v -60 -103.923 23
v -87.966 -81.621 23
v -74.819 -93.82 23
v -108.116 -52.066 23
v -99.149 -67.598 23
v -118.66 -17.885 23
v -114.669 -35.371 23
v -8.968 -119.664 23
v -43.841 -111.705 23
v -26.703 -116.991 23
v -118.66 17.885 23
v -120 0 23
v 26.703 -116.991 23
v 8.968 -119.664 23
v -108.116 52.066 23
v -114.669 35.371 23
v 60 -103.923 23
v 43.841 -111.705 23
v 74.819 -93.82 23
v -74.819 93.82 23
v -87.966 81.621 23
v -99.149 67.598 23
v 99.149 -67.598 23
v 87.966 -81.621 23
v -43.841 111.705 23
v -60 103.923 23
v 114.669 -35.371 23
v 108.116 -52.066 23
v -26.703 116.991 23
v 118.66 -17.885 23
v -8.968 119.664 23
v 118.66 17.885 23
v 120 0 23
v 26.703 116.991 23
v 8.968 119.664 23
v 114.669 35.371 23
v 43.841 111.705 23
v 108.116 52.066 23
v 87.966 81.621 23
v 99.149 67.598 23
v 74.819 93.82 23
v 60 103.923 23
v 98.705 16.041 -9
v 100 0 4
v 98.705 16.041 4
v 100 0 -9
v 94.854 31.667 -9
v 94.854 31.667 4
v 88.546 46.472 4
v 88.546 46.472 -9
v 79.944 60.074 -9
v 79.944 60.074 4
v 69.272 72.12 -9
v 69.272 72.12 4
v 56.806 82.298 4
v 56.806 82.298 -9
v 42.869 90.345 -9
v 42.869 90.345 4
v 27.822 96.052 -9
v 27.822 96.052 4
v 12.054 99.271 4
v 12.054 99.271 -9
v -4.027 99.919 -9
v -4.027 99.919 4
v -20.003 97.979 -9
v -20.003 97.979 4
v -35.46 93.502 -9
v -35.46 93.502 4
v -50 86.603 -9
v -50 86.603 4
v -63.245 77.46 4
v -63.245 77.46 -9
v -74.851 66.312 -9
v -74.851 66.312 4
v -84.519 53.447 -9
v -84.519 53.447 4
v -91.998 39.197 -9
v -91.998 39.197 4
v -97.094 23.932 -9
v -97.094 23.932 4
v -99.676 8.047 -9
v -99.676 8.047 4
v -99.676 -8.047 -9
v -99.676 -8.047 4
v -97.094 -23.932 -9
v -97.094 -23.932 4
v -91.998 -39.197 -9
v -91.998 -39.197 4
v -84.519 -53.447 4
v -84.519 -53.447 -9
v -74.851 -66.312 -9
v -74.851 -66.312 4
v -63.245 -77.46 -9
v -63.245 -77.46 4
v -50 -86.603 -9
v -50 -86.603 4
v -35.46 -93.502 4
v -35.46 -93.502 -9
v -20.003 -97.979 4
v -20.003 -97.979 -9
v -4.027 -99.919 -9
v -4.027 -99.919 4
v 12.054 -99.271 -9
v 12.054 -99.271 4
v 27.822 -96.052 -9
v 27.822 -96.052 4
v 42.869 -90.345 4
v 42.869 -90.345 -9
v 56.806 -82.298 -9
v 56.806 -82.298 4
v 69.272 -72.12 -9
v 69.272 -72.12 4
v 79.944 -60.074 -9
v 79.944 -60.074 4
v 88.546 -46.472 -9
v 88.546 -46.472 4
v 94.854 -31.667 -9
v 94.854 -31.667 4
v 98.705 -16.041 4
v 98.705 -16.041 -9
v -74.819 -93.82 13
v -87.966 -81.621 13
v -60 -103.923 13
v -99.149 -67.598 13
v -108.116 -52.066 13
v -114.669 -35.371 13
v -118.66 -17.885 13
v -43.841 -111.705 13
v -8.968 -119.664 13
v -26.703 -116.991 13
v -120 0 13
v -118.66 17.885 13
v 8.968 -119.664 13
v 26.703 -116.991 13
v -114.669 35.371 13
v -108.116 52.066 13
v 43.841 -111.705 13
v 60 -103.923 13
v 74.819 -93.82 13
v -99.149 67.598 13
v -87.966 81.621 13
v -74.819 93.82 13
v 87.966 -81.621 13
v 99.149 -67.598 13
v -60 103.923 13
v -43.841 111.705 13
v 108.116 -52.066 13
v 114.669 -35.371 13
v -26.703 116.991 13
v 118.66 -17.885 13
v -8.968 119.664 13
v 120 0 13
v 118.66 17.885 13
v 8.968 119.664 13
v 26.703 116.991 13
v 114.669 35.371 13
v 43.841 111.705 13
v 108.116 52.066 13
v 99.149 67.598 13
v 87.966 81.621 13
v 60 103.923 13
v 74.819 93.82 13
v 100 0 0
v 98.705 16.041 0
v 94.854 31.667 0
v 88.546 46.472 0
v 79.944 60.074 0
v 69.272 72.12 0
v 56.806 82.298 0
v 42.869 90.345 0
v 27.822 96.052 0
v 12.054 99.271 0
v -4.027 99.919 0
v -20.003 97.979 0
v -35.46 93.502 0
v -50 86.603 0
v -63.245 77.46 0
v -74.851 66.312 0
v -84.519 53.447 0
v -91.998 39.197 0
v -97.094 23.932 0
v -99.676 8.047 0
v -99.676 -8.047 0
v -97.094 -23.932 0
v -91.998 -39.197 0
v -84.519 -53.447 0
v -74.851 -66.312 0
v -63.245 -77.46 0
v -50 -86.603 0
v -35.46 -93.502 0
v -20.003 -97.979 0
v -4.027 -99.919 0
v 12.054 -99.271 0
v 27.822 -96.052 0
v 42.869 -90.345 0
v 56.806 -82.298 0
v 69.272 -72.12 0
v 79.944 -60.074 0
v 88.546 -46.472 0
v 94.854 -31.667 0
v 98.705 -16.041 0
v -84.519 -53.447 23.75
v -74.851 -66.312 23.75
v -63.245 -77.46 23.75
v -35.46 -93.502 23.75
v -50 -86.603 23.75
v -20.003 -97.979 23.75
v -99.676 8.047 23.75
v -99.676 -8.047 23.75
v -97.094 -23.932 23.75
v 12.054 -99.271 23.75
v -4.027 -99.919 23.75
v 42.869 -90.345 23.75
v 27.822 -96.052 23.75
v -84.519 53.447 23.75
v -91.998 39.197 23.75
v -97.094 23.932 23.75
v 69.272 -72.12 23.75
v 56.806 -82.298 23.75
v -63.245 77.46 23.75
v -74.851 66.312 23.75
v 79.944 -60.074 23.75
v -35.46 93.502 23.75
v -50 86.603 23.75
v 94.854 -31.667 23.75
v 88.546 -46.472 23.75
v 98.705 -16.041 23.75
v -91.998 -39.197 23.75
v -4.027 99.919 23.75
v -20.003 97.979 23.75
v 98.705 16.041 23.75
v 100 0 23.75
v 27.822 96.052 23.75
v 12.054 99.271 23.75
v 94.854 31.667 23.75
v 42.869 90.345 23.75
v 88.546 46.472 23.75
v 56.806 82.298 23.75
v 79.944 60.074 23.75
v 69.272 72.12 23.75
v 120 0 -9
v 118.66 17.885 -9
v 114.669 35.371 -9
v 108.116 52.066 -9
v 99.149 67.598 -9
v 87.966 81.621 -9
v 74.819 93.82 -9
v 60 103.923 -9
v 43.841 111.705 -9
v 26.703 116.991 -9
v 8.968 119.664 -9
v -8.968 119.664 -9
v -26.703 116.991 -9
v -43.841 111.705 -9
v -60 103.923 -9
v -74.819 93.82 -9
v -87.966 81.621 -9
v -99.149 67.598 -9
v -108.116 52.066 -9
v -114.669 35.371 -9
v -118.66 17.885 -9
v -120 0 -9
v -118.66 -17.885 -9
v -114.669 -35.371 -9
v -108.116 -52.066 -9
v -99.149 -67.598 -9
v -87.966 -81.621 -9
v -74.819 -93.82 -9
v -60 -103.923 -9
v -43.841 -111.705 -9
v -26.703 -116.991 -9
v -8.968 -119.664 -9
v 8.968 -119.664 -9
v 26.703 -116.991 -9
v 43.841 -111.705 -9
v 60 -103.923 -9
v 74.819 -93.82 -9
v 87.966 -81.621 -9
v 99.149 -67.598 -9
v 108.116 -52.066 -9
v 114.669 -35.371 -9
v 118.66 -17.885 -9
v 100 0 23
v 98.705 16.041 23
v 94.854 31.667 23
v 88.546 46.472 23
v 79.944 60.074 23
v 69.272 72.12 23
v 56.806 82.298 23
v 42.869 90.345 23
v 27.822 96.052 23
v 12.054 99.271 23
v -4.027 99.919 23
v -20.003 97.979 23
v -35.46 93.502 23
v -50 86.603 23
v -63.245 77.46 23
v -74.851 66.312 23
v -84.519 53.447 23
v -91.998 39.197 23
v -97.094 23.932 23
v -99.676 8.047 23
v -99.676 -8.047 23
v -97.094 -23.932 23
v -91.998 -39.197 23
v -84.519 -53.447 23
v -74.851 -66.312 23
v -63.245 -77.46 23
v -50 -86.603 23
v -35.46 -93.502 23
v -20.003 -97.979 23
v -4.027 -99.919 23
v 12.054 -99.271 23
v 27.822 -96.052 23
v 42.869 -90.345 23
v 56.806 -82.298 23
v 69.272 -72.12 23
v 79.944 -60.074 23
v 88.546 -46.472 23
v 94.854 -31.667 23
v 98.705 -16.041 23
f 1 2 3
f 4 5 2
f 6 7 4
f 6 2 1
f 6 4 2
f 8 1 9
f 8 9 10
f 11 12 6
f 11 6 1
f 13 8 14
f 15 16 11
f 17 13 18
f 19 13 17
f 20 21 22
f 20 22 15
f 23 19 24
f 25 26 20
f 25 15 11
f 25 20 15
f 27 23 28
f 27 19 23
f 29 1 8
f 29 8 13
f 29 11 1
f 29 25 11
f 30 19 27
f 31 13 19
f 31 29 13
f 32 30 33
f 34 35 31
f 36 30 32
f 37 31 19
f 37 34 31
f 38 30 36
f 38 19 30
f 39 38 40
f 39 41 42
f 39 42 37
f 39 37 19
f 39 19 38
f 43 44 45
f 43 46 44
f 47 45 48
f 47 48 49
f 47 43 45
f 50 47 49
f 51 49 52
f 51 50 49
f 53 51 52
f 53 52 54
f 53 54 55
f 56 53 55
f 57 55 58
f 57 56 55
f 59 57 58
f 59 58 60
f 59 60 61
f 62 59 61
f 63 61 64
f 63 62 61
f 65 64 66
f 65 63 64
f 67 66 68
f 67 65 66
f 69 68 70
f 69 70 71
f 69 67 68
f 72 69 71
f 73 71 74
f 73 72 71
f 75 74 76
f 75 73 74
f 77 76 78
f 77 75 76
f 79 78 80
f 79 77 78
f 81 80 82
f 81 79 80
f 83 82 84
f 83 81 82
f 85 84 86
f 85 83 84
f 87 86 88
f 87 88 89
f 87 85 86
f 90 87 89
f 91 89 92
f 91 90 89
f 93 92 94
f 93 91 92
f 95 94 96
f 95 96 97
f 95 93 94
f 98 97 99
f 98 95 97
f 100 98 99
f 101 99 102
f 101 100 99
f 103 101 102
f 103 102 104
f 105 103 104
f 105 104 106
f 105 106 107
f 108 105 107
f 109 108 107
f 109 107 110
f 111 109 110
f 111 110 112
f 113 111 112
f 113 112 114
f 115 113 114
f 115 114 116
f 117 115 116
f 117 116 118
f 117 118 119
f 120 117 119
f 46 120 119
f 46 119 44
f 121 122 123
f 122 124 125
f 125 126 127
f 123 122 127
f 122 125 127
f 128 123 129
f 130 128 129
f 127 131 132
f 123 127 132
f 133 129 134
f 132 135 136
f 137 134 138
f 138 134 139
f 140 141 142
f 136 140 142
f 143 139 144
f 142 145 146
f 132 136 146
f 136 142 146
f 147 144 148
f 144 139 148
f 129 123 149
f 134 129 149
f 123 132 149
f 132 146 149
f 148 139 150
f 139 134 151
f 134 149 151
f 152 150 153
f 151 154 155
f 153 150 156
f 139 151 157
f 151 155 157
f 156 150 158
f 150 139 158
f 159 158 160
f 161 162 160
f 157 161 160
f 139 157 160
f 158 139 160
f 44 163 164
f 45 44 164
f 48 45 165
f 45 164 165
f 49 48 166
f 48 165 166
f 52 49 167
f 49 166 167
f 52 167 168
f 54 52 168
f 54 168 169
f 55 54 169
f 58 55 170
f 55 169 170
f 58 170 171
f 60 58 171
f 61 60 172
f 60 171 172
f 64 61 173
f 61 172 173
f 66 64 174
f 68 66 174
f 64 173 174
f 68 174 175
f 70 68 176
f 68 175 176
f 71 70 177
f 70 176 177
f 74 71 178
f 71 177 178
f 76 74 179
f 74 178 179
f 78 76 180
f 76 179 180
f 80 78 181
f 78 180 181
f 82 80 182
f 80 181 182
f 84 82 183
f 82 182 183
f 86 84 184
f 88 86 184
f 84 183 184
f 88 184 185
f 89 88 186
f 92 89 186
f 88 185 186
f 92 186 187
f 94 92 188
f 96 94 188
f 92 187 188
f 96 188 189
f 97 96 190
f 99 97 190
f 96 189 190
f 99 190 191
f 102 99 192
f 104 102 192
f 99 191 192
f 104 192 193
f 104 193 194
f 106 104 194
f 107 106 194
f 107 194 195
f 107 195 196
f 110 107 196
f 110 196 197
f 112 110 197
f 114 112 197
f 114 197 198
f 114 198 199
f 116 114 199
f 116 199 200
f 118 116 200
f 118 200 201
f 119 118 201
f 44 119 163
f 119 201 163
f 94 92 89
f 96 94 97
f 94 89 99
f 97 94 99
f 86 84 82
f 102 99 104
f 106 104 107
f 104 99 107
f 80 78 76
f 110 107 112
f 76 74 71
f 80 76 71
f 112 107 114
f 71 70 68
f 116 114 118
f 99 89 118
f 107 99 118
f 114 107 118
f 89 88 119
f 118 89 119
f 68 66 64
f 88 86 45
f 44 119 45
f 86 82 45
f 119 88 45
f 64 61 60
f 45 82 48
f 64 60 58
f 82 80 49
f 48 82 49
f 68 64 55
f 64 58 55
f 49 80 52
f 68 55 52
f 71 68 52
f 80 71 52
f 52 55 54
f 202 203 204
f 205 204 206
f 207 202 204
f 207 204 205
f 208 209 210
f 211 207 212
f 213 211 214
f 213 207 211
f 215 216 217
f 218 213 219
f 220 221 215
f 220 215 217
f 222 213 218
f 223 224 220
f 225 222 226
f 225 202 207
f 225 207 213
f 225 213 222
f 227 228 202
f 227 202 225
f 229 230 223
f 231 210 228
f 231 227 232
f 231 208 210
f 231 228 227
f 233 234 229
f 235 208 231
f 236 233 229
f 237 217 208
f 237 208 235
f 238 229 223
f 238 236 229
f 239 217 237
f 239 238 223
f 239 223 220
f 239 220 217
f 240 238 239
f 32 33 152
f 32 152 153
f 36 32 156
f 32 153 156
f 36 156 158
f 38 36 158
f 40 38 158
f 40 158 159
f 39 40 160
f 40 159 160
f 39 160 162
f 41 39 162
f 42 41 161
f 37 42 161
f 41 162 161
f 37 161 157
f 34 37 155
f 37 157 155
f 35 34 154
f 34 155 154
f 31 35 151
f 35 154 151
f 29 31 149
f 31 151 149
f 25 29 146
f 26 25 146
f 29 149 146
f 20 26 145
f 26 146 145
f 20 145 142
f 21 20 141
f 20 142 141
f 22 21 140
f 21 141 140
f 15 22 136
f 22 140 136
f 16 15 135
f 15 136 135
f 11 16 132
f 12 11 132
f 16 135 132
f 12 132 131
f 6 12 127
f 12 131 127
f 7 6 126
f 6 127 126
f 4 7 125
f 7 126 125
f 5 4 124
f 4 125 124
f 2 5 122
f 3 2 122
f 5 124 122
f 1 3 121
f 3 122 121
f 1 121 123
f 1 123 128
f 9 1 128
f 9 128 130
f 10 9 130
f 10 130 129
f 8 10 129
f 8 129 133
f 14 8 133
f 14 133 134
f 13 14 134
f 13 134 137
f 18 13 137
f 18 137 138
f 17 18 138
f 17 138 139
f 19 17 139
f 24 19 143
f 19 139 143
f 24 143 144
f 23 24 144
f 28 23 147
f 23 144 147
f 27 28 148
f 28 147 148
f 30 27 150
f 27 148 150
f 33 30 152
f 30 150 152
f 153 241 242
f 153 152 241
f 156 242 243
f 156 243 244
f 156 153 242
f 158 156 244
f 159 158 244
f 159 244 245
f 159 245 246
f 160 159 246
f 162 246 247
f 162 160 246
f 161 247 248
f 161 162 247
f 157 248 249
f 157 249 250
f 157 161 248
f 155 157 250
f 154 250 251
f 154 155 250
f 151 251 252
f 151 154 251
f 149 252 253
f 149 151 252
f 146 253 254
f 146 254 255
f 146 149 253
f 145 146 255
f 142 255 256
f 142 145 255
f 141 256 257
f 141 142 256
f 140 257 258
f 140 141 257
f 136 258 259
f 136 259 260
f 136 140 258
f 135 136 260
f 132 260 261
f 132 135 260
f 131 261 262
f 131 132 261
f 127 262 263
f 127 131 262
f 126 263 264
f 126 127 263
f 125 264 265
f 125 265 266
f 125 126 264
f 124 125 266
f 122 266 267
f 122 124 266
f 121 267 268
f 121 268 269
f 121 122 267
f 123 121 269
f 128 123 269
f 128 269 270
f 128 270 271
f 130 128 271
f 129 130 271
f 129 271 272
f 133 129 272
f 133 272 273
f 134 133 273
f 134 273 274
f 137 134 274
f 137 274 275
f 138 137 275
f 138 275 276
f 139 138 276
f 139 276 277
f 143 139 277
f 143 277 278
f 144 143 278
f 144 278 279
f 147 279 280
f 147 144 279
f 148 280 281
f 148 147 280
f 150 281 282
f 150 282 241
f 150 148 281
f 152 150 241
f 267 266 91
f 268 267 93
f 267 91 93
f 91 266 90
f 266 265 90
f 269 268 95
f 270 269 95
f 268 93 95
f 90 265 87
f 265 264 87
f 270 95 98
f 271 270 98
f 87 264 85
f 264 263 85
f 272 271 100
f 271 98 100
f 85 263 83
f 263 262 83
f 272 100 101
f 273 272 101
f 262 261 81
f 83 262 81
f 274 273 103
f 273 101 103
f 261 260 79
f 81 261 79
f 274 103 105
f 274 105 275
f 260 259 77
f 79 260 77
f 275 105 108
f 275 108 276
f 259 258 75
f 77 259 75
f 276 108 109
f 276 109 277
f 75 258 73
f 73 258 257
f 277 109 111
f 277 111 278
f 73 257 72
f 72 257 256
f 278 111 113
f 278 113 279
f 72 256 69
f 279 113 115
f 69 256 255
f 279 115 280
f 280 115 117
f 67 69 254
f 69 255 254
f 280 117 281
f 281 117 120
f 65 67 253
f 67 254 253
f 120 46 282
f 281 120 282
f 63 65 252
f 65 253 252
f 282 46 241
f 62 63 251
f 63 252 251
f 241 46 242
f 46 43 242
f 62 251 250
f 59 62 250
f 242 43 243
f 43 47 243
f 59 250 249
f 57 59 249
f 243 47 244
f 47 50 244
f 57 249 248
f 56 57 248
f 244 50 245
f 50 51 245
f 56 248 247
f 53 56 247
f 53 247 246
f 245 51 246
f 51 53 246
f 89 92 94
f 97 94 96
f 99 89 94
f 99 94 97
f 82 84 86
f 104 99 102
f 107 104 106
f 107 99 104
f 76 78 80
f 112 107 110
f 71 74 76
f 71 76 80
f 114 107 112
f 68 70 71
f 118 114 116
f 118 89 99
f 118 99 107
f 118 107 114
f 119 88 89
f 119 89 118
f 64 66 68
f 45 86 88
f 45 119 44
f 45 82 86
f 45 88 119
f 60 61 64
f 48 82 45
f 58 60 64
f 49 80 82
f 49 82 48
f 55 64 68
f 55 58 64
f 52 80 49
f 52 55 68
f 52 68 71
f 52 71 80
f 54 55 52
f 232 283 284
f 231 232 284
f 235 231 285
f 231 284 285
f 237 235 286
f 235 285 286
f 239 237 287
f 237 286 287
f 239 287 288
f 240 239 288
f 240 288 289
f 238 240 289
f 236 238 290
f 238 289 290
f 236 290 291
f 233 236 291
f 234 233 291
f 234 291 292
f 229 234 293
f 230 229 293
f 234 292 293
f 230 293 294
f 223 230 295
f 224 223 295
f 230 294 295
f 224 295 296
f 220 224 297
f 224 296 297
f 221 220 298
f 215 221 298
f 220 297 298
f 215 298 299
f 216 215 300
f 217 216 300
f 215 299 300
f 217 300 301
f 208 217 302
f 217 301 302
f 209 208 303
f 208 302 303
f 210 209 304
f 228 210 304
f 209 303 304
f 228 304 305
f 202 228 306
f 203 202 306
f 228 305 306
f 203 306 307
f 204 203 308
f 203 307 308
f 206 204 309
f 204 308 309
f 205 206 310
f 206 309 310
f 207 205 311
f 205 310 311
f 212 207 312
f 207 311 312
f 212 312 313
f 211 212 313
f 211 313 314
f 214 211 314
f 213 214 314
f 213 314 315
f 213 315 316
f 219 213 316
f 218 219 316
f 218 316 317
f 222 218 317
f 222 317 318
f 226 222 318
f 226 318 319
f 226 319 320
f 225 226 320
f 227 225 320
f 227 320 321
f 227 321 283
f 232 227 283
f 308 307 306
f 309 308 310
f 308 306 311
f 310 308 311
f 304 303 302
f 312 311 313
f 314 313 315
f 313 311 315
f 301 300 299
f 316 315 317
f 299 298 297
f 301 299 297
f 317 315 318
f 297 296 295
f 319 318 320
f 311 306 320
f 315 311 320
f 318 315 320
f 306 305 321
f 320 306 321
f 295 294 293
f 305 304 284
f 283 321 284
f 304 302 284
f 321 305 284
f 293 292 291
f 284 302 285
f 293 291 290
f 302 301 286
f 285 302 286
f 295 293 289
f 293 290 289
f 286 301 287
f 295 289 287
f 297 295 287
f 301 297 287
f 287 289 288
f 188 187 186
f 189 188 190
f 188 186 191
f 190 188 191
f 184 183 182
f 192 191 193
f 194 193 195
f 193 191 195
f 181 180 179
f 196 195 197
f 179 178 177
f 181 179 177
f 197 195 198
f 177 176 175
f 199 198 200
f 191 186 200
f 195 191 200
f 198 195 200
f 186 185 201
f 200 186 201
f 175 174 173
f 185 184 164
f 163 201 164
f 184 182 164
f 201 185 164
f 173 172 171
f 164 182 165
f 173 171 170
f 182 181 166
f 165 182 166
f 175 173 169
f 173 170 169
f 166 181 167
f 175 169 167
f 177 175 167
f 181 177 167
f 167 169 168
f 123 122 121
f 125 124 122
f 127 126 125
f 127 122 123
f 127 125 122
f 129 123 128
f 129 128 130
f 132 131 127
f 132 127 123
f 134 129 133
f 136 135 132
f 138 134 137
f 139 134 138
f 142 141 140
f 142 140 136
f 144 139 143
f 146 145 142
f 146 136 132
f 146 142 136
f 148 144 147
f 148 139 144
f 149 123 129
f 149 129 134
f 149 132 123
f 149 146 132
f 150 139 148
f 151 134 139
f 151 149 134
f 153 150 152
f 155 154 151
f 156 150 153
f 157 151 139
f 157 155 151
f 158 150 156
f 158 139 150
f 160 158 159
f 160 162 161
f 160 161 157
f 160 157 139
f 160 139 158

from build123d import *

# Parameters (mm, degrees)
F0_R     = 120
F0_R_2   = 100
F1_DEPTH = 9
F2_DEPTH = 4
F3_DEPTH = 13
F4_DEPTH = 9
F5_DEPTH = 10
F6_R     = 100
F7_DEPTH = 0.75


with BuildPart() as f1:
    # F0 (on Top) → F1 (new body)
    with BuildSketch(Plane.XY):
        Circle(F0_R)
        Circle(F0_R_2, mode=Mode.SUBTRACT)
    extrude(amount=-F1_DEPTH)

    # F0 (on Top) → F3 (join)
    with BuildSketch(Plane.XY):
        Circle(F0_R)
        Circle(F0_R_2, mode=Mode.SUBTRACT)
    extrude(amount=F3_DEPTH)



with BuildPart() as f2:
    # F0 (on Top) → F2 (new body)
    with BuildSketch(Plane.XY):
        Circle(F0_R_2)
    extrude(amount=F2_DEPTH)


with BuildPart() as f1_1:
    add(f1.part)
    # F4 (add): a face of the model
    f4_faces = [f2.part.faces().sort_by_distance(p)[0] for p in [
        (0, 0, 4),
    ]]
    extrude(f4_faces, amount=F4_DEPTH)


with BuildPart() as f5:
    # F5 (new): a face of the model
    f5_faces = [f1_1.part.faces().sort_by_distance(p)[0] for p in [
        (0, 0, 13),
    ]]
    extrude(f5_faces, amount=F5_DEPTH)


with BuildPart() as f7:
    # F6 (on face) → F7 (new body)
    with BuildSketch(Plane.XY.offset(23)):
        Circle(F6_R)
    extrude(amount=F7_DEPTH)


solid = Compound([f2.part, f1_1.part, f5.part, f7.part])
